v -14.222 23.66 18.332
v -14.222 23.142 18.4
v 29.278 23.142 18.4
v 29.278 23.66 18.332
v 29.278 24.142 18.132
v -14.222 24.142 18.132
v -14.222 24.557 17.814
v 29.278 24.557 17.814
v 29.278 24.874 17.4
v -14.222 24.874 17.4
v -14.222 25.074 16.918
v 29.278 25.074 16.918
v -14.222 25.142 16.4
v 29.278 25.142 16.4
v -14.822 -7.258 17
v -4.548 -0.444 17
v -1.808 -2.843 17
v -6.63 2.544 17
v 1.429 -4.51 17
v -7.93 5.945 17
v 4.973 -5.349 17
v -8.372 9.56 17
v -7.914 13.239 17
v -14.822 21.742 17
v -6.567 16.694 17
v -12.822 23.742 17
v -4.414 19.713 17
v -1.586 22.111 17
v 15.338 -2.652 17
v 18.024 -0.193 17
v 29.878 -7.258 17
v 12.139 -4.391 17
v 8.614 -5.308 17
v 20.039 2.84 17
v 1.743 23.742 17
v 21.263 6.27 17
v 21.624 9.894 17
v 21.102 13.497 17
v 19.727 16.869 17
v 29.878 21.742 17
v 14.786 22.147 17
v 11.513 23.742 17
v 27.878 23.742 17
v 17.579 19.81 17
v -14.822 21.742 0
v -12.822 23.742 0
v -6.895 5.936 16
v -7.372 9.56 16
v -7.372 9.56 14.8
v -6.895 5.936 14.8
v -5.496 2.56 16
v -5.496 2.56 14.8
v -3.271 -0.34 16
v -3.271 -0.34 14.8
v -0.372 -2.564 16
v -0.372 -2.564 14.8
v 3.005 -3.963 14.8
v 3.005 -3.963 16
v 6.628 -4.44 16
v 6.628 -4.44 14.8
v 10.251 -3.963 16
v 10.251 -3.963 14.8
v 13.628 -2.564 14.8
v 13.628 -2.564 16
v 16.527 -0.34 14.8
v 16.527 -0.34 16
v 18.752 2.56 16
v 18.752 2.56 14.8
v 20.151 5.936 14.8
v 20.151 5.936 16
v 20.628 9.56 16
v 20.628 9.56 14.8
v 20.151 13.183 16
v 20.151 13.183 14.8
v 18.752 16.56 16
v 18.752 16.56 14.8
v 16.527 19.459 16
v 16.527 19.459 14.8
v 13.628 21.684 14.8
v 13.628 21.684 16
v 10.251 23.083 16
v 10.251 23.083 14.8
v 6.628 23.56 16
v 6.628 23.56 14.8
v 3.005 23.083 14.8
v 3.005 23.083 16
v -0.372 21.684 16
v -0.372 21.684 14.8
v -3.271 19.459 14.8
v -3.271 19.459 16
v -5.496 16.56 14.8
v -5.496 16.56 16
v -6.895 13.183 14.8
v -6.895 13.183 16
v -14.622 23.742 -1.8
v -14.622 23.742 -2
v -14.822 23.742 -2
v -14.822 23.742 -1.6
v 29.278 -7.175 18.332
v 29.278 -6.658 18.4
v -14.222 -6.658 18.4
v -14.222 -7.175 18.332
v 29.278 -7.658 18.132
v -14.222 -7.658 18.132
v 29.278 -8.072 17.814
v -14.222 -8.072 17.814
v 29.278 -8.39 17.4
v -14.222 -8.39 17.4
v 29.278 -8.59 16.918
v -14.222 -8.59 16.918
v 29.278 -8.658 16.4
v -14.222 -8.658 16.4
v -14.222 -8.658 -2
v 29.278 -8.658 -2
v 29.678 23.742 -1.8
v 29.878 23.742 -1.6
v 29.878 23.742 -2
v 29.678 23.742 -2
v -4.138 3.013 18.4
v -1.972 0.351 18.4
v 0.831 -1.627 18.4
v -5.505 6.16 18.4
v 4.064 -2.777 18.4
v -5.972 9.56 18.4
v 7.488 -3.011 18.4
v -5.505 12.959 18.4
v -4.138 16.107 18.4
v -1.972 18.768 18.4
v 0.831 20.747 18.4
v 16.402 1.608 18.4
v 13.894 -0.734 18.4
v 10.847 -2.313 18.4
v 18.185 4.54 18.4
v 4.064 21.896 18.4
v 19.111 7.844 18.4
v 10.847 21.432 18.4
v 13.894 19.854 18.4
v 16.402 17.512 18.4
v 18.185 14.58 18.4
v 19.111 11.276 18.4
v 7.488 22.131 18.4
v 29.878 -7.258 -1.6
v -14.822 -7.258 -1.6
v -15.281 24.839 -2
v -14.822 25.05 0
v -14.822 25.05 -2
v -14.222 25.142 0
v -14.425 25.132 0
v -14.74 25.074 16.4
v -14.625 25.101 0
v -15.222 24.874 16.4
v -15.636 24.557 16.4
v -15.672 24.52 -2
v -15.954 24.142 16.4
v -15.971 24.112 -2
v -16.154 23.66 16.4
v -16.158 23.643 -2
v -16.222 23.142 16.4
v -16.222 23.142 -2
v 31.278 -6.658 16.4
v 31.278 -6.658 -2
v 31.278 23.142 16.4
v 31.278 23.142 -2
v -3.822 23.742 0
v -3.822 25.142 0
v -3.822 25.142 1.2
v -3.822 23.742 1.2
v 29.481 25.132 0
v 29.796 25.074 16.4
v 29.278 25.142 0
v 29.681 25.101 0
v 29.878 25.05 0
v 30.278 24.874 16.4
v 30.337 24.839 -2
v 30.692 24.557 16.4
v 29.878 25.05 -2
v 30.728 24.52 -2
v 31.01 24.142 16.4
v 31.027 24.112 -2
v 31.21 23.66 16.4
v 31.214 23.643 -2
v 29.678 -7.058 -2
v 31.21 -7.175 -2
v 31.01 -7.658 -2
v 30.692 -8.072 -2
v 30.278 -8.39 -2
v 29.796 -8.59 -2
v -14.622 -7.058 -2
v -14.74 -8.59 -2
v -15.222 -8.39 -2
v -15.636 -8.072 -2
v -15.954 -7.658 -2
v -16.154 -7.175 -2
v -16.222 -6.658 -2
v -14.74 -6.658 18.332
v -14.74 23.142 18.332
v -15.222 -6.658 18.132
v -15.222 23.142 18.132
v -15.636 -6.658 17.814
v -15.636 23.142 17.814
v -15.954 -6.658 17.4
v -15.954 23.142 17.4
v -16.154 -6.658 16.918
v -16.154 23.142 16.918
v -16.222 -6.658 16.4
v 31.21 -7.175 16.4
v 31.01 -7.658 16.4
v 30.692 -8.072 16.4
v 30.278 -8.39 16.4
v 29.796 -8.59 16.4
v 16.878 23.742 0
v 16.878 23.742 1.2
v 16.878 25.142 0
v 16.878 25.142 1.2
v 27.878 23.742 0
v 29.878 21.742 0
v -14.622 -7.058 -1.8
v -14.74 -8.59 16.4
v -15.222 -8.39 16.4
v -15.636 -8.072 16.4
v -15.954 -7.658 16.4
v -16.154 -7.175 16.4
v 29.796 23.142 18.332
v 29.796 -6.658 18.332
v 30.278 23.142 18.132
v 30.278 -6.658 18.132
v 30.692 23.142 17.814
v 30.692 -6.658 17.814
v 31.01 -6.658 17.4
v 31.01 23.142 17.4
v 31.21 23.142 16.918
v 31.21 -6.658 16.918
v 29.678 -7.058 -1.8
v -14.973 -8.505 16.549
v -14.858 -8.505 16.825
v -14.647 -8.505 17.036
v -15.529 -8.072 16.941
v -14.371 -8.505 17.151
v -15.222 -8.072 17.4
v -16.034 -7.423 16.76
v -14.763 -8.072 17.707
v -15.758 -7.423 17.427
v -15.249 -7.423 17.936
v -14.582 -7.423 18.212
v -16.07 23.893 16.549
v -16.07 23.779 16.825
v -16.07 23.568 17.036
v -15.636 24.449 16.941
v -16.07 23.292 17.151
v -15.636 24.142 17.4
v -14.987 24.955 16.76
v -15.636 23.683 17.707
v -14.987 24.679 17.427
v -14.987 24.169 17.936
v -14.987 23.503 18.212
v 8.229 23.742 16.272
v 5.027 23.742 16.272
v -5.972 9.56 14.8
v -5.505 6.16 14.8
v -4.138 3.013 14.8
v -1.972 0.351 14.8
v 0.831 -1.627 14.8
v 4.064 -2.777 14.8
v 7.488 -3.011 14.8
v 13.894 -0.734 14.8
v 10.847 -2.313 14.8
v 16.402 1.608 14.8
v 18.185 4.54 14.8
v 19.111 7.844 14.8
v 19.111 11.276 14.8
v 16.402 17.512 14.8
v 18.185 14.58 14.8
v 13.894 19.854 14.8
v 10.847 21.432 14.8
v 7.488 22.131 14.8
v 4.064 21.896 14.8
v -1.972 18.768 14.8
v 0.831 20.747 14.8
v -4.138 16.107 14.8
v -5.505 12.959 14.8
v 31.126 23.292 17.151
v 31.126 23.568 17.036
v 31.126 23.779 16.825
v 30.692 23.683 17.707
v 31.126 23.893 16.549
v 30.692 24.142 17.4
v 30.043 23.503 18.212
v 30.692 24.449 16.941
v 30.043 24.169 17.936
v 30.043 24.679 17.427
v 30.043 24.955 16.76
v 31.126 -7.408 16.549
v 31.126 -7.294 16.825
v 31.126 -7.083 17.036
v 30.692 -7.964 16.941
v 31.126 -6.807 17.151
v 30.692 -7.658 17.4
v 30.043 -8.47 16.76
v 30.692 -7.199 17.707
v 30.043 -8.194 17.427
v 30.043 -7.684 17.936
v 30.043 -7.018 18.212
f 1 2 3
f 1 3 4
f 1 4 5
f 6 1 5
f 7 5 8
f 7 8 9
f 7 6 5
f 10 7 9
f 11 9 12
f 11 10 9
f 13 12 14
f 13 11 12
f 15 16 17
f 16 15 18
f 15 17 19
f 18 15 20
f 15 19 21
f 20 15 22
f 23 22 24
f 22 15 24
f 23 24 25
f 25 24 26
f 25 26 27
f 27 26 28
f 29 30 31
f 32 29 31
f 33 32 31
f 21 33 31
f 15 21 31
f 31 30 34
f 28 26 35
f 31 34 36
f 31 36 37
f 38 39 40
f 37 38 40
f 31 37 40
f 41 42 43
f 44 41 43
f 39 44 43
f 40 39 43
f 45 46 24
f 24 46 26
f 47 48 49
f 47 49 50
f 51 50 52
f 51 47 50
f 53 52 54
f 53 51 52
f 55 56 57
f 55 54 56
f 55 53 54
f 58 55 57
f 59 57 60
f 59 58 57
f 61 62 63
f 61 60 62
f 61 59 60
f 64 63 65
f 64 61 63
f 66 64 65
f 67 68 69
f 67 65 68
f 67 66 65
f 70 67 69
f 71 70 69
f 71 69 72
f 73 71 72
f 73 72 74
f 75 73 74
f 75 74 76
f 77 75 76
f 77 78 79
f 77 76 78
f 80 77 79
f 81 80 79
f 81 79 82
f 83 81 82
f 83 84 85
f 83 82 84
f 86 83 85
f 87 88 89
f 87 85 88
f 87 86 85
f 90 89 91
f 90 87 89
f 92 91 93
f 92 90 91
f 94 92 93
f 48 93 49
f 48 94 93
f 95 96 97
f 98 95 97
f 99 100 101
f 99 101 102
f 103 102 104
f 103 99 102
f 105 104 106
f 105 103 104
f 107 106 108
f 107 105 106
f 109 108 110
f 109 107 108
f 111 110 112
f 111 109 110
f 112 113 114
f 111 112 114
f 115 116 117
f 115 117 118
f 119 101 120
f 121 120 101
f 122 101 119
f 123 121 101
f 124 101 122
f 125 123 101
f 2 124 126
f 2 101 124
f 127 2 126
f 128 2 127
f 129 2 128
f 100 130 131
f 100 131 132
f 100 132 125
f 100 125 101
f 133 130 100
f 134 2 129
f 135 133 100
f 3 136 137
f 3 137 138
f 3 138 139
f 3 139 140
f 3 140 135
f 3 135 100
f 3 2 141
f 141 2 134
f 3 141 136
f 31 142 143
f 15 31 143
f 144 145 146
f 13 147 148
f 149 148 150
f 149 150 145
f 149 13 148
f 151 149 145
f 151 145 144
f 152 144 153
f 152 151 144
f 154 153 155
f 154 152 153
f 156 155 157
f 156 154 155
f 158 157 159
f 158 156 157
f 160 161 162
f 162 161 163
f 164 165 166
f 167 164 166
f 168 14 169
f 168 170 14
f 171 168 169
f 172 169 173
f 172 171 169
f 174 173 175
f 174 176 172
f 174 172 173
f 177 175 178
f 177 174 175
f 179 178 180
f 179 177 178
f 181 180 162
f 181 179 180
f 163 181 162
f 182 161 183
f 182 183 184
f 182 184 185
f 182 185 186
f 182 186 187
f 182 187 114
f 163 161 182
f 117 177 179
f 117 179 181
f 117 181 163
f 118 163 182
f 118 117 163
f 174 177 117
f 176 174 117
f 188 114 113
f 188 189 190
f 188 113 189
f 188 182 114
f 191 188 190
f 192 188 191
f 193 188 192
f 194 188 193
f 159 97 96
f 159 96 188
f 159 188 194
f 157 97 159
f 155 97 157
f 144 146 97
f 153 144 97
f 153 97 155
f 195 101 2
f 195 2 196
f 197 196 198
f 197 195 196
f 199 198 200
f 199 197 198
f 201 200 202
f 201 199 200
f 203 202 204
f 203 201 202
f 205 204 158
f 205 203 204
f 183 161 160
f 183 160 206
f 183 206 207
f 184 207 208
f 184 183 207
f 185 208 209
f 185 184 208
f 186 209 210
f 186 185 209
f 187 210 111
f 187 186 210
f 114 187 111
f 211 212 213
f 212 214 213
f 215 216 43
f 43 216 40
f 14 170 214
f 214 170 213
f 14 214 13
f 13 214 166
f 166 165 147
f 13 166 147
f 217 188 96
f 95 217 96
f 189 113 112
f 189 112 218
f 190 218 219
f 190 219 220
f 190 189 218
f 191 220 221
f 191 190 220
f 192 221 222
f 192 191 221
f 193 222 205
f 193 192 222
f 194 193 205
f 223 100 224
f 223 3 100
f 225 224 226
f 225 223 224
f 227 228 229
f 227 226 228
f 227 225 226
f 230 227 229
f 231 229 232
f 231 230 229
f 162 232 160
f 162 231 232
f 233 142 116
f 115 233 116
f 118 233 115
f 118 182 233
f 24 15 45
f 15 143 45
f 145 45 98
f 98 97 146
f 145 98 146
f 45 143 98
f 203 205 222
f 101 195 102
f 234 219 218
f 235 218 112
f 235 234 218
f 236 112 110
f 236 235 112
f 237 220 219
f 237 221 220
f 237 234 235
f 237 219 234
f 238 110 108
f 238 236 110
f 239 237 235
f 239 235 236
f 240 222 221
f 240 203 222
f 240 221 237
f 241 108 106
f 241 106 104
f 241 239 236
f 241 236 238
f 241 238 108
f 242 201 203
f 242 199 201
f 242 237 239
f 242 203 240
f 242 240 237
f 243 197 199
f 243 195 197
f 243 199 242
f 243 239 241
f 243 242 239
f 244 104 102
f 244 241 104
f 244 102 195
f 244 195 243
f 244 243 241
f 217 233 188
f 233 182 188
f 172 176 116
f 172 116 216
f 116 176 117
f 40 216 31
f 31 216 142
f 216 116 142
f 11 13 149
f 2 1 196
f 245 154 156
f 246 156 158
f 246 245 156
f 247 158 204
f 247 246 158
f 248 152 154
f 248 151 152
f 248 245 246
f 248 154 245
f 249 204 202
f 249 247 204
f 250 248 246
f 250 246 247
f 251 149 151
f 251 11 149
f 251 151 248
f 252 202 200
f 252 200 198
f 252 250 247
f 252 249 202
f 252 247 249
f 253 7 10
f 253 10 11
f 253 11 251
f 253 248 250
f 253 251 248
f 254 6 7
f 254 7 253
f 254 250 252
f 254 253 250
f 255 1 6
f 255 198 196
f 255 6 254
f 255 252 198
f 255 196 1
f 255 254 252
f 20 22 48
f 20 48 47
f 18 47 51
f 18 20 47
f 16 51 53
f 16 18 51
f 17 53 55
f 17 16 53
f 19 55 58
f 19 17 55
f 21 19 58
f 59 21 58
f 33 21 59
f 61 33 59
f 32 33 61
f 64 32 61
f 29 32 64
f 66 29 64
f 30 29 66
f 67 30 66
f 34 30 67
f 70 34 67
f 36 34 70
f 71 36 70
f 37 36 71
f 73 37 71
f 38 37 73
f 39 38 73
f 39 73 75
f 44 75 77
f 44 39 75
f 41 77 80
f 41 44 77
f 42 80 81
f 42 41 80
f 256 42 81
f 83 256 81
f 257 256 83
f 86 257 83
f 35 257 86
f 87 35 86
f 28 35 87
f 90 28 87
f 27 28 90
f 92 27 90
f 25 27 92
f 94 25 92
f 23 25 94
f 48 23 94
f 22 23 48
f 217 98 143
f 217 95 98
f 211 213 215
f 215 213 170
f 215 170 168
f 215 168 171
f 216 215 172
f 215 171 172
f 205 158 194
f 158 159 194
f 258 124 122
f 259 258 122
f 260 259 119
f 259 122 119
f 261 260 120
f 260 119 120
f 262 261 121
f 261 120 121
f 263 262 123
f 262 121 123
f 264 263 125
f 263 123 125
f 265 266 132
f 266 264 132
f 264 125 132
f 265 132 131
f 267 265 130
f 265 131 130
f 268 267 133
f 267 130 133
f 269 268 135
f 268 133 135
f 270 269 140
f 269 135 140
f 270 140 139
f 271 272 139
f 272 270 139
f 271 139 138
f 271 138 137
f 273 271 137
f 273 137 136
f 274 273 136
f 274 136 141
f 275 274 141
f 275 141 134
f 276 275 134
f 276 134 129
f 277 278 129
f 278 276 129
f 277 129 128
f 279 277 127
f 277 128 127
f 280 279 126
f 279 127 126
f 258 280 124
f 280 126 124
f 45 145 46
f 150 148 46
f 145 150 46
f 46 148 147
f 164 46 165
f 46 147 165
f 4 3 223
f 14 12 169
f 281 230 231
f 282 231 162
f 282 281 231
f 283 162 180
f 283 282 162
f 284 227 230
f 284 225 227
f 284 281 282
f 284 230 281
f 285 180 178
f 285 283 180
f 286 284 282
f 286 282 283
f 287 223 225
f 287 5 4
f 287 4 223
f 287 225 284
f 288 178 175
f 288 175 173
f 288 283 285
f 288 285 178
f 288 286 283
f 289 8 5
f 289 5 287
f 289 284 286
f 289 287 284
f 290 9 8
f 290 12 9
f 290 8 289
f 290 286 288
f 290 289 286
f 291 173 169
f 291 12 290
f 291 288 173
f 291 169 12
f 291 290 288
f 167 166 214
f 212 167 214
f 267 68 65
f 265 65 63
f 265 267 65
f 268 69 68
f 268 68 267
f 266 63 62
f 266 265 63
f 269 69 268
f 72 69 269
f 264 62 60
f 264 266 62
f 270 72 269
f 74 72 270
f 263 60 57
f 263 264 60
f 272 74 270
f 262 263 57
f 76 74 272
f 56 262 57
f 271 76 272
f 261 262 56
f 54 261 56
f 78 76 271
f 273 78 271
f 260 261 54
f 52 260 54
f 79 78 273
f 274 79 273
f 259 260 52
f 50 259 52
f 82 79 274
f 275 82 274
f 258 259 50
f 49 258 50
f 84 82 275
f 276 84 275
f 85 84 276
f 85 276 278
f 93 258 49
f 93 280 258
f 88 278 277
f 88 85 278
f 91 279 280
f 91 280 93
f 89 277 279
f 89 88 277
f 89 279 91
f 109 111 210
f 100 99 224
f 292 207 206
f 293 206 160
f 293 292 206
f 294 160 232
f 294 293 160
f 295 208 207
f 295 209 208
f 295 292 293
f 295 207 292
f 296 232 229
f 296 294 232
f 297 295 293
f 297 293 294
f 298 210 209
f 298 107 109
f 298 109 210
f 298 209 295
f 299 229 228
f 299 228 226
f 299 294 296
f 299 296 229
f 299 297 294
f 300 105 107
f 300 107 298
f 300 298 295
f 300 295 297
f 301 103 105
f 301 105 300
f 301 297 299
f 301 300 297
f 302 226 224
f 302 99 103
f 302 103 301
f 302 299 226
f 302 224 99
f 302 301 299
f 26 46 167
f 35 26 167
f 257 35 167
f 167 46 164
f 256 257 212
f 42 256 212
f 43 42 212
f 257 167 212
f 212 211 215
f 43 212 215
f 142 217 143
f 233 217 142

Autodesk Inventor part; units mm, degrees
ref_plane "YZ Plane" through (0, 0, 0) normal (1, 0, 0) x (0, 1, 0)
ref_plane "XZ Plane" through (0, 0, 0) normal (0, 1, 0) x (-1, 0, 0)
ref_plane "XY Plane" through (0, 0, 0) normal (0, 0, 1) x (1, 0, 0)
sketch "Sketch1" plane through (0, 0, 0) normal (0, 0, 1) x (1, 0, 0)
  line L0 (-14.822, 23.7423) -> (29.878, 23.7423)
  line L1 (29.878, 23.7423) -> (29.878, -7.2577)
  line L2 (29.878, -7.2577) -> (-14.822, -7.2577)
  line L3 (-14.822, -7.2577) -> (-14.822, 23.7423)
  line L4 (31.278, 25.1423) -> (-16.222, 25.1423)
  line L5 (-16.222, 25.1423) -> (-16.222, -8.6577)
  line L6 (-16.222, -8.6577) -> (31.278, -8.6577)
  line L7 (31.278, -8.6577) -> (31.278, 25.1423)
  point P0 (0, 0)
  dimension "d0" = 44.7
  dimension "d1" = 31
  dimension "d2" = 1.4
extrude "Extrusion1" add sketch "Sketch1" along normal blind 17
sketch "Sketch2" plane through (0, 0, 17) normal (0, 0, 1) x (1, 0, 0)
  line L0 (31.278, 25.1423) -> (-16.222, 25.1423) projected
  line L1 (-16.222, 25.1423) -> (-16.222, -8.6577) projected
  line L2 (-16.222, -8.6577) -> (31.278, -8.6577) projected
  line L3 (31.278, -8.6577) -> (31.278, 25.1423) projected
  point P0 (0, 0)
extrude "Extrusion2" add sketch "Sketch2" along normal blind 1.4
sketch "Sketch4" plane through (0, 0, 17) normal (0, 0, -1) x (-1, 0, 0)
  circle A0 centre (-6.628, 9.5599) radius 12.6
  line L0 (-29.878, -7.2577) -> (-29.878, 23.7423) projected
  line L1 (14.822, 23.7423) -> (14.822, -7.2577) projected
  point P0 (0, 0)
  dimension "d7" = 23.25
  dimension "d8" = 44.7
  dimension "d9" = 25.2
extrude "Extrusion3" cut sketch "Sketch4" against normal blind 1.4
sketch "Sketch5" plane through (0, 0, 17) normal (0, 0, -1) x (-1, 0, 0)
  circle A0 centre (-6.628, 9.5599) radius 12.6 projected
  circle A1 centre (-6.628, 9.5599) radius 14
  point P0 (0, 0)
  dimension "d12" = 1.4
extrude "Extrusion4" add sketch "Sketch5" along normal blind 2.2
chamfer "Chamfer1" distance 1 angle 45 1 edges at (20.628, 9.5599, 17)
sketch "Sketch6" plane through (0, 0, 0) normal (0, 0, -1) x (-1, 0, 0)
  line L0 (16.222, 25.1423) -> (16.222, -8.6577) projected
  line L1 (16.222, -8.6577) -> (-31.278, -8.6577) projected
  line L2 (-31.278, -8.6577) -> (-31.278, 25.1423) projected
  line L3 (14.822, 23.7423) -> (14.822, -7.2577) projected
  line L4 (14.822, -7.2577) -> (-29.878, -7.2577) projected
  line L5 (-29.878, -7.2577) -> (-29.878, 23.7423) projected
  line L6 (14.822, 23.7423) -> (-1.7434, 23.7423) projected
  line L7 (14.822, 23.7423) -> (14.822, 25.1423)
  line L8 (14.822, 25.1423) -> (16.222, 25.1423)
  line L9 (-29.878, 23.7423) -> (-29.878, 25.1423)
  line L10 (-29.878, 25.1423) -> (-31.278, 25.1423)
  point P0 (0, 0)
extrude "Extrusion5" add sketch "Sketch6" along normal blind 2
sketch "Sketch8" plane through (0, 0, -2) normal (0, 0, -1) x (-1, 0, 0)
  line L0 (14.822, -7.2577) -> (14.822, 23.7423) projected
  line L1 (-29.878, 23.7423) -> (-29.878, -7.2577) projected
  line L2 (14.822, -7.2577) -> (-29.878, -7.2577)
  line L3 (-29.878, -7.2577) -> (-29.878, 23.7423)
  line L4 (14.822, 23.7423) -> (14.822, -7.2577)
  line L5 (-29.678, -7.0577) -> (14.622, -7.0577)
  line L6 (14.622, -7.0577) -> (14.622, 23.5423)
  line L7 (-29.678, 23.5423) -> (-29.678, -7.0577)
  line L8 (14.622, 23.5423) -> (14.622, 23.7423)
  line L9 (-29.678, 23.5423) -> (-29.678, 23.7423)
  line L10 (-29.878, 23.7423) -> (14.822, 23.7423) projected
  line L11 (-29.878, 23.7423) -> (-29.678, 23.7423)
  line L12 (14.622, 23.7423) -> (14.822, 23.7423)
  point P0 (0, 0)
  dimension "d24" = 0.2
extrude "Extrusion7" add sketch "Sketch8" against normal blind 0.4 contours L2 L1 L10 L9 L7 L5 L6 L8 L0
chamfer "Chamfer2" distance 0.2 angle 45 3 edges at (7.528, -7.0577, -1.6) (-14.622, 8.3423, -1.6) (29.678, 8.3423, -1.6)
chamfer "Chamfer3" distance 2 angle 45 1 edges at (-14.822, 23.7423, 8.5)
chamfer "Chamfer4" distance 2 angle 45 1 edges at (29.878, 23.7423, 8.5)
sketch "Sketch9" plane through (-14.822, 25.1423, 0) normal (0, 1, 0) x (1, 0, 0)
  line L0 (42.7, 0) -> (2, 0) projected
  line L1 (31.7, 0) -> (11, 0)
  line L2 (11, 0) -> (11, -1.2)
  line L3 (11, -1.2) -> (31.7, -1.2)
  line L4 (31.7, -1.2) -> (31.7, 0)
  line L5 (44.7, 0) -> (44.7, -17) projected
  line L6 (0, -17) -> (0, 0) projected
  point P0 (14.822, 0)
  dimension "d48" = 13
  dimension "d49" = 11
  dimension "d50" = 1.2
extrude "Extrusion8" cut sketch "Sketch9" against normal up to surface (1.4 mm away)
fillet "Fillet3" radius 2 8 edges at (7.528, 25.1423, 18.4) (-16.222, 8.2423, 18.4) (-16.222, 25.1423, 8.2) (-16.222, -8.6577, 8.2) (7.528, -8.6577, 18.4) (31.278, 8.2423, 18.4) (31.278, -8.6577, 8.2) (31.278, 25.1423, 8.2)
properties part number "lupa-card-c-mount"
